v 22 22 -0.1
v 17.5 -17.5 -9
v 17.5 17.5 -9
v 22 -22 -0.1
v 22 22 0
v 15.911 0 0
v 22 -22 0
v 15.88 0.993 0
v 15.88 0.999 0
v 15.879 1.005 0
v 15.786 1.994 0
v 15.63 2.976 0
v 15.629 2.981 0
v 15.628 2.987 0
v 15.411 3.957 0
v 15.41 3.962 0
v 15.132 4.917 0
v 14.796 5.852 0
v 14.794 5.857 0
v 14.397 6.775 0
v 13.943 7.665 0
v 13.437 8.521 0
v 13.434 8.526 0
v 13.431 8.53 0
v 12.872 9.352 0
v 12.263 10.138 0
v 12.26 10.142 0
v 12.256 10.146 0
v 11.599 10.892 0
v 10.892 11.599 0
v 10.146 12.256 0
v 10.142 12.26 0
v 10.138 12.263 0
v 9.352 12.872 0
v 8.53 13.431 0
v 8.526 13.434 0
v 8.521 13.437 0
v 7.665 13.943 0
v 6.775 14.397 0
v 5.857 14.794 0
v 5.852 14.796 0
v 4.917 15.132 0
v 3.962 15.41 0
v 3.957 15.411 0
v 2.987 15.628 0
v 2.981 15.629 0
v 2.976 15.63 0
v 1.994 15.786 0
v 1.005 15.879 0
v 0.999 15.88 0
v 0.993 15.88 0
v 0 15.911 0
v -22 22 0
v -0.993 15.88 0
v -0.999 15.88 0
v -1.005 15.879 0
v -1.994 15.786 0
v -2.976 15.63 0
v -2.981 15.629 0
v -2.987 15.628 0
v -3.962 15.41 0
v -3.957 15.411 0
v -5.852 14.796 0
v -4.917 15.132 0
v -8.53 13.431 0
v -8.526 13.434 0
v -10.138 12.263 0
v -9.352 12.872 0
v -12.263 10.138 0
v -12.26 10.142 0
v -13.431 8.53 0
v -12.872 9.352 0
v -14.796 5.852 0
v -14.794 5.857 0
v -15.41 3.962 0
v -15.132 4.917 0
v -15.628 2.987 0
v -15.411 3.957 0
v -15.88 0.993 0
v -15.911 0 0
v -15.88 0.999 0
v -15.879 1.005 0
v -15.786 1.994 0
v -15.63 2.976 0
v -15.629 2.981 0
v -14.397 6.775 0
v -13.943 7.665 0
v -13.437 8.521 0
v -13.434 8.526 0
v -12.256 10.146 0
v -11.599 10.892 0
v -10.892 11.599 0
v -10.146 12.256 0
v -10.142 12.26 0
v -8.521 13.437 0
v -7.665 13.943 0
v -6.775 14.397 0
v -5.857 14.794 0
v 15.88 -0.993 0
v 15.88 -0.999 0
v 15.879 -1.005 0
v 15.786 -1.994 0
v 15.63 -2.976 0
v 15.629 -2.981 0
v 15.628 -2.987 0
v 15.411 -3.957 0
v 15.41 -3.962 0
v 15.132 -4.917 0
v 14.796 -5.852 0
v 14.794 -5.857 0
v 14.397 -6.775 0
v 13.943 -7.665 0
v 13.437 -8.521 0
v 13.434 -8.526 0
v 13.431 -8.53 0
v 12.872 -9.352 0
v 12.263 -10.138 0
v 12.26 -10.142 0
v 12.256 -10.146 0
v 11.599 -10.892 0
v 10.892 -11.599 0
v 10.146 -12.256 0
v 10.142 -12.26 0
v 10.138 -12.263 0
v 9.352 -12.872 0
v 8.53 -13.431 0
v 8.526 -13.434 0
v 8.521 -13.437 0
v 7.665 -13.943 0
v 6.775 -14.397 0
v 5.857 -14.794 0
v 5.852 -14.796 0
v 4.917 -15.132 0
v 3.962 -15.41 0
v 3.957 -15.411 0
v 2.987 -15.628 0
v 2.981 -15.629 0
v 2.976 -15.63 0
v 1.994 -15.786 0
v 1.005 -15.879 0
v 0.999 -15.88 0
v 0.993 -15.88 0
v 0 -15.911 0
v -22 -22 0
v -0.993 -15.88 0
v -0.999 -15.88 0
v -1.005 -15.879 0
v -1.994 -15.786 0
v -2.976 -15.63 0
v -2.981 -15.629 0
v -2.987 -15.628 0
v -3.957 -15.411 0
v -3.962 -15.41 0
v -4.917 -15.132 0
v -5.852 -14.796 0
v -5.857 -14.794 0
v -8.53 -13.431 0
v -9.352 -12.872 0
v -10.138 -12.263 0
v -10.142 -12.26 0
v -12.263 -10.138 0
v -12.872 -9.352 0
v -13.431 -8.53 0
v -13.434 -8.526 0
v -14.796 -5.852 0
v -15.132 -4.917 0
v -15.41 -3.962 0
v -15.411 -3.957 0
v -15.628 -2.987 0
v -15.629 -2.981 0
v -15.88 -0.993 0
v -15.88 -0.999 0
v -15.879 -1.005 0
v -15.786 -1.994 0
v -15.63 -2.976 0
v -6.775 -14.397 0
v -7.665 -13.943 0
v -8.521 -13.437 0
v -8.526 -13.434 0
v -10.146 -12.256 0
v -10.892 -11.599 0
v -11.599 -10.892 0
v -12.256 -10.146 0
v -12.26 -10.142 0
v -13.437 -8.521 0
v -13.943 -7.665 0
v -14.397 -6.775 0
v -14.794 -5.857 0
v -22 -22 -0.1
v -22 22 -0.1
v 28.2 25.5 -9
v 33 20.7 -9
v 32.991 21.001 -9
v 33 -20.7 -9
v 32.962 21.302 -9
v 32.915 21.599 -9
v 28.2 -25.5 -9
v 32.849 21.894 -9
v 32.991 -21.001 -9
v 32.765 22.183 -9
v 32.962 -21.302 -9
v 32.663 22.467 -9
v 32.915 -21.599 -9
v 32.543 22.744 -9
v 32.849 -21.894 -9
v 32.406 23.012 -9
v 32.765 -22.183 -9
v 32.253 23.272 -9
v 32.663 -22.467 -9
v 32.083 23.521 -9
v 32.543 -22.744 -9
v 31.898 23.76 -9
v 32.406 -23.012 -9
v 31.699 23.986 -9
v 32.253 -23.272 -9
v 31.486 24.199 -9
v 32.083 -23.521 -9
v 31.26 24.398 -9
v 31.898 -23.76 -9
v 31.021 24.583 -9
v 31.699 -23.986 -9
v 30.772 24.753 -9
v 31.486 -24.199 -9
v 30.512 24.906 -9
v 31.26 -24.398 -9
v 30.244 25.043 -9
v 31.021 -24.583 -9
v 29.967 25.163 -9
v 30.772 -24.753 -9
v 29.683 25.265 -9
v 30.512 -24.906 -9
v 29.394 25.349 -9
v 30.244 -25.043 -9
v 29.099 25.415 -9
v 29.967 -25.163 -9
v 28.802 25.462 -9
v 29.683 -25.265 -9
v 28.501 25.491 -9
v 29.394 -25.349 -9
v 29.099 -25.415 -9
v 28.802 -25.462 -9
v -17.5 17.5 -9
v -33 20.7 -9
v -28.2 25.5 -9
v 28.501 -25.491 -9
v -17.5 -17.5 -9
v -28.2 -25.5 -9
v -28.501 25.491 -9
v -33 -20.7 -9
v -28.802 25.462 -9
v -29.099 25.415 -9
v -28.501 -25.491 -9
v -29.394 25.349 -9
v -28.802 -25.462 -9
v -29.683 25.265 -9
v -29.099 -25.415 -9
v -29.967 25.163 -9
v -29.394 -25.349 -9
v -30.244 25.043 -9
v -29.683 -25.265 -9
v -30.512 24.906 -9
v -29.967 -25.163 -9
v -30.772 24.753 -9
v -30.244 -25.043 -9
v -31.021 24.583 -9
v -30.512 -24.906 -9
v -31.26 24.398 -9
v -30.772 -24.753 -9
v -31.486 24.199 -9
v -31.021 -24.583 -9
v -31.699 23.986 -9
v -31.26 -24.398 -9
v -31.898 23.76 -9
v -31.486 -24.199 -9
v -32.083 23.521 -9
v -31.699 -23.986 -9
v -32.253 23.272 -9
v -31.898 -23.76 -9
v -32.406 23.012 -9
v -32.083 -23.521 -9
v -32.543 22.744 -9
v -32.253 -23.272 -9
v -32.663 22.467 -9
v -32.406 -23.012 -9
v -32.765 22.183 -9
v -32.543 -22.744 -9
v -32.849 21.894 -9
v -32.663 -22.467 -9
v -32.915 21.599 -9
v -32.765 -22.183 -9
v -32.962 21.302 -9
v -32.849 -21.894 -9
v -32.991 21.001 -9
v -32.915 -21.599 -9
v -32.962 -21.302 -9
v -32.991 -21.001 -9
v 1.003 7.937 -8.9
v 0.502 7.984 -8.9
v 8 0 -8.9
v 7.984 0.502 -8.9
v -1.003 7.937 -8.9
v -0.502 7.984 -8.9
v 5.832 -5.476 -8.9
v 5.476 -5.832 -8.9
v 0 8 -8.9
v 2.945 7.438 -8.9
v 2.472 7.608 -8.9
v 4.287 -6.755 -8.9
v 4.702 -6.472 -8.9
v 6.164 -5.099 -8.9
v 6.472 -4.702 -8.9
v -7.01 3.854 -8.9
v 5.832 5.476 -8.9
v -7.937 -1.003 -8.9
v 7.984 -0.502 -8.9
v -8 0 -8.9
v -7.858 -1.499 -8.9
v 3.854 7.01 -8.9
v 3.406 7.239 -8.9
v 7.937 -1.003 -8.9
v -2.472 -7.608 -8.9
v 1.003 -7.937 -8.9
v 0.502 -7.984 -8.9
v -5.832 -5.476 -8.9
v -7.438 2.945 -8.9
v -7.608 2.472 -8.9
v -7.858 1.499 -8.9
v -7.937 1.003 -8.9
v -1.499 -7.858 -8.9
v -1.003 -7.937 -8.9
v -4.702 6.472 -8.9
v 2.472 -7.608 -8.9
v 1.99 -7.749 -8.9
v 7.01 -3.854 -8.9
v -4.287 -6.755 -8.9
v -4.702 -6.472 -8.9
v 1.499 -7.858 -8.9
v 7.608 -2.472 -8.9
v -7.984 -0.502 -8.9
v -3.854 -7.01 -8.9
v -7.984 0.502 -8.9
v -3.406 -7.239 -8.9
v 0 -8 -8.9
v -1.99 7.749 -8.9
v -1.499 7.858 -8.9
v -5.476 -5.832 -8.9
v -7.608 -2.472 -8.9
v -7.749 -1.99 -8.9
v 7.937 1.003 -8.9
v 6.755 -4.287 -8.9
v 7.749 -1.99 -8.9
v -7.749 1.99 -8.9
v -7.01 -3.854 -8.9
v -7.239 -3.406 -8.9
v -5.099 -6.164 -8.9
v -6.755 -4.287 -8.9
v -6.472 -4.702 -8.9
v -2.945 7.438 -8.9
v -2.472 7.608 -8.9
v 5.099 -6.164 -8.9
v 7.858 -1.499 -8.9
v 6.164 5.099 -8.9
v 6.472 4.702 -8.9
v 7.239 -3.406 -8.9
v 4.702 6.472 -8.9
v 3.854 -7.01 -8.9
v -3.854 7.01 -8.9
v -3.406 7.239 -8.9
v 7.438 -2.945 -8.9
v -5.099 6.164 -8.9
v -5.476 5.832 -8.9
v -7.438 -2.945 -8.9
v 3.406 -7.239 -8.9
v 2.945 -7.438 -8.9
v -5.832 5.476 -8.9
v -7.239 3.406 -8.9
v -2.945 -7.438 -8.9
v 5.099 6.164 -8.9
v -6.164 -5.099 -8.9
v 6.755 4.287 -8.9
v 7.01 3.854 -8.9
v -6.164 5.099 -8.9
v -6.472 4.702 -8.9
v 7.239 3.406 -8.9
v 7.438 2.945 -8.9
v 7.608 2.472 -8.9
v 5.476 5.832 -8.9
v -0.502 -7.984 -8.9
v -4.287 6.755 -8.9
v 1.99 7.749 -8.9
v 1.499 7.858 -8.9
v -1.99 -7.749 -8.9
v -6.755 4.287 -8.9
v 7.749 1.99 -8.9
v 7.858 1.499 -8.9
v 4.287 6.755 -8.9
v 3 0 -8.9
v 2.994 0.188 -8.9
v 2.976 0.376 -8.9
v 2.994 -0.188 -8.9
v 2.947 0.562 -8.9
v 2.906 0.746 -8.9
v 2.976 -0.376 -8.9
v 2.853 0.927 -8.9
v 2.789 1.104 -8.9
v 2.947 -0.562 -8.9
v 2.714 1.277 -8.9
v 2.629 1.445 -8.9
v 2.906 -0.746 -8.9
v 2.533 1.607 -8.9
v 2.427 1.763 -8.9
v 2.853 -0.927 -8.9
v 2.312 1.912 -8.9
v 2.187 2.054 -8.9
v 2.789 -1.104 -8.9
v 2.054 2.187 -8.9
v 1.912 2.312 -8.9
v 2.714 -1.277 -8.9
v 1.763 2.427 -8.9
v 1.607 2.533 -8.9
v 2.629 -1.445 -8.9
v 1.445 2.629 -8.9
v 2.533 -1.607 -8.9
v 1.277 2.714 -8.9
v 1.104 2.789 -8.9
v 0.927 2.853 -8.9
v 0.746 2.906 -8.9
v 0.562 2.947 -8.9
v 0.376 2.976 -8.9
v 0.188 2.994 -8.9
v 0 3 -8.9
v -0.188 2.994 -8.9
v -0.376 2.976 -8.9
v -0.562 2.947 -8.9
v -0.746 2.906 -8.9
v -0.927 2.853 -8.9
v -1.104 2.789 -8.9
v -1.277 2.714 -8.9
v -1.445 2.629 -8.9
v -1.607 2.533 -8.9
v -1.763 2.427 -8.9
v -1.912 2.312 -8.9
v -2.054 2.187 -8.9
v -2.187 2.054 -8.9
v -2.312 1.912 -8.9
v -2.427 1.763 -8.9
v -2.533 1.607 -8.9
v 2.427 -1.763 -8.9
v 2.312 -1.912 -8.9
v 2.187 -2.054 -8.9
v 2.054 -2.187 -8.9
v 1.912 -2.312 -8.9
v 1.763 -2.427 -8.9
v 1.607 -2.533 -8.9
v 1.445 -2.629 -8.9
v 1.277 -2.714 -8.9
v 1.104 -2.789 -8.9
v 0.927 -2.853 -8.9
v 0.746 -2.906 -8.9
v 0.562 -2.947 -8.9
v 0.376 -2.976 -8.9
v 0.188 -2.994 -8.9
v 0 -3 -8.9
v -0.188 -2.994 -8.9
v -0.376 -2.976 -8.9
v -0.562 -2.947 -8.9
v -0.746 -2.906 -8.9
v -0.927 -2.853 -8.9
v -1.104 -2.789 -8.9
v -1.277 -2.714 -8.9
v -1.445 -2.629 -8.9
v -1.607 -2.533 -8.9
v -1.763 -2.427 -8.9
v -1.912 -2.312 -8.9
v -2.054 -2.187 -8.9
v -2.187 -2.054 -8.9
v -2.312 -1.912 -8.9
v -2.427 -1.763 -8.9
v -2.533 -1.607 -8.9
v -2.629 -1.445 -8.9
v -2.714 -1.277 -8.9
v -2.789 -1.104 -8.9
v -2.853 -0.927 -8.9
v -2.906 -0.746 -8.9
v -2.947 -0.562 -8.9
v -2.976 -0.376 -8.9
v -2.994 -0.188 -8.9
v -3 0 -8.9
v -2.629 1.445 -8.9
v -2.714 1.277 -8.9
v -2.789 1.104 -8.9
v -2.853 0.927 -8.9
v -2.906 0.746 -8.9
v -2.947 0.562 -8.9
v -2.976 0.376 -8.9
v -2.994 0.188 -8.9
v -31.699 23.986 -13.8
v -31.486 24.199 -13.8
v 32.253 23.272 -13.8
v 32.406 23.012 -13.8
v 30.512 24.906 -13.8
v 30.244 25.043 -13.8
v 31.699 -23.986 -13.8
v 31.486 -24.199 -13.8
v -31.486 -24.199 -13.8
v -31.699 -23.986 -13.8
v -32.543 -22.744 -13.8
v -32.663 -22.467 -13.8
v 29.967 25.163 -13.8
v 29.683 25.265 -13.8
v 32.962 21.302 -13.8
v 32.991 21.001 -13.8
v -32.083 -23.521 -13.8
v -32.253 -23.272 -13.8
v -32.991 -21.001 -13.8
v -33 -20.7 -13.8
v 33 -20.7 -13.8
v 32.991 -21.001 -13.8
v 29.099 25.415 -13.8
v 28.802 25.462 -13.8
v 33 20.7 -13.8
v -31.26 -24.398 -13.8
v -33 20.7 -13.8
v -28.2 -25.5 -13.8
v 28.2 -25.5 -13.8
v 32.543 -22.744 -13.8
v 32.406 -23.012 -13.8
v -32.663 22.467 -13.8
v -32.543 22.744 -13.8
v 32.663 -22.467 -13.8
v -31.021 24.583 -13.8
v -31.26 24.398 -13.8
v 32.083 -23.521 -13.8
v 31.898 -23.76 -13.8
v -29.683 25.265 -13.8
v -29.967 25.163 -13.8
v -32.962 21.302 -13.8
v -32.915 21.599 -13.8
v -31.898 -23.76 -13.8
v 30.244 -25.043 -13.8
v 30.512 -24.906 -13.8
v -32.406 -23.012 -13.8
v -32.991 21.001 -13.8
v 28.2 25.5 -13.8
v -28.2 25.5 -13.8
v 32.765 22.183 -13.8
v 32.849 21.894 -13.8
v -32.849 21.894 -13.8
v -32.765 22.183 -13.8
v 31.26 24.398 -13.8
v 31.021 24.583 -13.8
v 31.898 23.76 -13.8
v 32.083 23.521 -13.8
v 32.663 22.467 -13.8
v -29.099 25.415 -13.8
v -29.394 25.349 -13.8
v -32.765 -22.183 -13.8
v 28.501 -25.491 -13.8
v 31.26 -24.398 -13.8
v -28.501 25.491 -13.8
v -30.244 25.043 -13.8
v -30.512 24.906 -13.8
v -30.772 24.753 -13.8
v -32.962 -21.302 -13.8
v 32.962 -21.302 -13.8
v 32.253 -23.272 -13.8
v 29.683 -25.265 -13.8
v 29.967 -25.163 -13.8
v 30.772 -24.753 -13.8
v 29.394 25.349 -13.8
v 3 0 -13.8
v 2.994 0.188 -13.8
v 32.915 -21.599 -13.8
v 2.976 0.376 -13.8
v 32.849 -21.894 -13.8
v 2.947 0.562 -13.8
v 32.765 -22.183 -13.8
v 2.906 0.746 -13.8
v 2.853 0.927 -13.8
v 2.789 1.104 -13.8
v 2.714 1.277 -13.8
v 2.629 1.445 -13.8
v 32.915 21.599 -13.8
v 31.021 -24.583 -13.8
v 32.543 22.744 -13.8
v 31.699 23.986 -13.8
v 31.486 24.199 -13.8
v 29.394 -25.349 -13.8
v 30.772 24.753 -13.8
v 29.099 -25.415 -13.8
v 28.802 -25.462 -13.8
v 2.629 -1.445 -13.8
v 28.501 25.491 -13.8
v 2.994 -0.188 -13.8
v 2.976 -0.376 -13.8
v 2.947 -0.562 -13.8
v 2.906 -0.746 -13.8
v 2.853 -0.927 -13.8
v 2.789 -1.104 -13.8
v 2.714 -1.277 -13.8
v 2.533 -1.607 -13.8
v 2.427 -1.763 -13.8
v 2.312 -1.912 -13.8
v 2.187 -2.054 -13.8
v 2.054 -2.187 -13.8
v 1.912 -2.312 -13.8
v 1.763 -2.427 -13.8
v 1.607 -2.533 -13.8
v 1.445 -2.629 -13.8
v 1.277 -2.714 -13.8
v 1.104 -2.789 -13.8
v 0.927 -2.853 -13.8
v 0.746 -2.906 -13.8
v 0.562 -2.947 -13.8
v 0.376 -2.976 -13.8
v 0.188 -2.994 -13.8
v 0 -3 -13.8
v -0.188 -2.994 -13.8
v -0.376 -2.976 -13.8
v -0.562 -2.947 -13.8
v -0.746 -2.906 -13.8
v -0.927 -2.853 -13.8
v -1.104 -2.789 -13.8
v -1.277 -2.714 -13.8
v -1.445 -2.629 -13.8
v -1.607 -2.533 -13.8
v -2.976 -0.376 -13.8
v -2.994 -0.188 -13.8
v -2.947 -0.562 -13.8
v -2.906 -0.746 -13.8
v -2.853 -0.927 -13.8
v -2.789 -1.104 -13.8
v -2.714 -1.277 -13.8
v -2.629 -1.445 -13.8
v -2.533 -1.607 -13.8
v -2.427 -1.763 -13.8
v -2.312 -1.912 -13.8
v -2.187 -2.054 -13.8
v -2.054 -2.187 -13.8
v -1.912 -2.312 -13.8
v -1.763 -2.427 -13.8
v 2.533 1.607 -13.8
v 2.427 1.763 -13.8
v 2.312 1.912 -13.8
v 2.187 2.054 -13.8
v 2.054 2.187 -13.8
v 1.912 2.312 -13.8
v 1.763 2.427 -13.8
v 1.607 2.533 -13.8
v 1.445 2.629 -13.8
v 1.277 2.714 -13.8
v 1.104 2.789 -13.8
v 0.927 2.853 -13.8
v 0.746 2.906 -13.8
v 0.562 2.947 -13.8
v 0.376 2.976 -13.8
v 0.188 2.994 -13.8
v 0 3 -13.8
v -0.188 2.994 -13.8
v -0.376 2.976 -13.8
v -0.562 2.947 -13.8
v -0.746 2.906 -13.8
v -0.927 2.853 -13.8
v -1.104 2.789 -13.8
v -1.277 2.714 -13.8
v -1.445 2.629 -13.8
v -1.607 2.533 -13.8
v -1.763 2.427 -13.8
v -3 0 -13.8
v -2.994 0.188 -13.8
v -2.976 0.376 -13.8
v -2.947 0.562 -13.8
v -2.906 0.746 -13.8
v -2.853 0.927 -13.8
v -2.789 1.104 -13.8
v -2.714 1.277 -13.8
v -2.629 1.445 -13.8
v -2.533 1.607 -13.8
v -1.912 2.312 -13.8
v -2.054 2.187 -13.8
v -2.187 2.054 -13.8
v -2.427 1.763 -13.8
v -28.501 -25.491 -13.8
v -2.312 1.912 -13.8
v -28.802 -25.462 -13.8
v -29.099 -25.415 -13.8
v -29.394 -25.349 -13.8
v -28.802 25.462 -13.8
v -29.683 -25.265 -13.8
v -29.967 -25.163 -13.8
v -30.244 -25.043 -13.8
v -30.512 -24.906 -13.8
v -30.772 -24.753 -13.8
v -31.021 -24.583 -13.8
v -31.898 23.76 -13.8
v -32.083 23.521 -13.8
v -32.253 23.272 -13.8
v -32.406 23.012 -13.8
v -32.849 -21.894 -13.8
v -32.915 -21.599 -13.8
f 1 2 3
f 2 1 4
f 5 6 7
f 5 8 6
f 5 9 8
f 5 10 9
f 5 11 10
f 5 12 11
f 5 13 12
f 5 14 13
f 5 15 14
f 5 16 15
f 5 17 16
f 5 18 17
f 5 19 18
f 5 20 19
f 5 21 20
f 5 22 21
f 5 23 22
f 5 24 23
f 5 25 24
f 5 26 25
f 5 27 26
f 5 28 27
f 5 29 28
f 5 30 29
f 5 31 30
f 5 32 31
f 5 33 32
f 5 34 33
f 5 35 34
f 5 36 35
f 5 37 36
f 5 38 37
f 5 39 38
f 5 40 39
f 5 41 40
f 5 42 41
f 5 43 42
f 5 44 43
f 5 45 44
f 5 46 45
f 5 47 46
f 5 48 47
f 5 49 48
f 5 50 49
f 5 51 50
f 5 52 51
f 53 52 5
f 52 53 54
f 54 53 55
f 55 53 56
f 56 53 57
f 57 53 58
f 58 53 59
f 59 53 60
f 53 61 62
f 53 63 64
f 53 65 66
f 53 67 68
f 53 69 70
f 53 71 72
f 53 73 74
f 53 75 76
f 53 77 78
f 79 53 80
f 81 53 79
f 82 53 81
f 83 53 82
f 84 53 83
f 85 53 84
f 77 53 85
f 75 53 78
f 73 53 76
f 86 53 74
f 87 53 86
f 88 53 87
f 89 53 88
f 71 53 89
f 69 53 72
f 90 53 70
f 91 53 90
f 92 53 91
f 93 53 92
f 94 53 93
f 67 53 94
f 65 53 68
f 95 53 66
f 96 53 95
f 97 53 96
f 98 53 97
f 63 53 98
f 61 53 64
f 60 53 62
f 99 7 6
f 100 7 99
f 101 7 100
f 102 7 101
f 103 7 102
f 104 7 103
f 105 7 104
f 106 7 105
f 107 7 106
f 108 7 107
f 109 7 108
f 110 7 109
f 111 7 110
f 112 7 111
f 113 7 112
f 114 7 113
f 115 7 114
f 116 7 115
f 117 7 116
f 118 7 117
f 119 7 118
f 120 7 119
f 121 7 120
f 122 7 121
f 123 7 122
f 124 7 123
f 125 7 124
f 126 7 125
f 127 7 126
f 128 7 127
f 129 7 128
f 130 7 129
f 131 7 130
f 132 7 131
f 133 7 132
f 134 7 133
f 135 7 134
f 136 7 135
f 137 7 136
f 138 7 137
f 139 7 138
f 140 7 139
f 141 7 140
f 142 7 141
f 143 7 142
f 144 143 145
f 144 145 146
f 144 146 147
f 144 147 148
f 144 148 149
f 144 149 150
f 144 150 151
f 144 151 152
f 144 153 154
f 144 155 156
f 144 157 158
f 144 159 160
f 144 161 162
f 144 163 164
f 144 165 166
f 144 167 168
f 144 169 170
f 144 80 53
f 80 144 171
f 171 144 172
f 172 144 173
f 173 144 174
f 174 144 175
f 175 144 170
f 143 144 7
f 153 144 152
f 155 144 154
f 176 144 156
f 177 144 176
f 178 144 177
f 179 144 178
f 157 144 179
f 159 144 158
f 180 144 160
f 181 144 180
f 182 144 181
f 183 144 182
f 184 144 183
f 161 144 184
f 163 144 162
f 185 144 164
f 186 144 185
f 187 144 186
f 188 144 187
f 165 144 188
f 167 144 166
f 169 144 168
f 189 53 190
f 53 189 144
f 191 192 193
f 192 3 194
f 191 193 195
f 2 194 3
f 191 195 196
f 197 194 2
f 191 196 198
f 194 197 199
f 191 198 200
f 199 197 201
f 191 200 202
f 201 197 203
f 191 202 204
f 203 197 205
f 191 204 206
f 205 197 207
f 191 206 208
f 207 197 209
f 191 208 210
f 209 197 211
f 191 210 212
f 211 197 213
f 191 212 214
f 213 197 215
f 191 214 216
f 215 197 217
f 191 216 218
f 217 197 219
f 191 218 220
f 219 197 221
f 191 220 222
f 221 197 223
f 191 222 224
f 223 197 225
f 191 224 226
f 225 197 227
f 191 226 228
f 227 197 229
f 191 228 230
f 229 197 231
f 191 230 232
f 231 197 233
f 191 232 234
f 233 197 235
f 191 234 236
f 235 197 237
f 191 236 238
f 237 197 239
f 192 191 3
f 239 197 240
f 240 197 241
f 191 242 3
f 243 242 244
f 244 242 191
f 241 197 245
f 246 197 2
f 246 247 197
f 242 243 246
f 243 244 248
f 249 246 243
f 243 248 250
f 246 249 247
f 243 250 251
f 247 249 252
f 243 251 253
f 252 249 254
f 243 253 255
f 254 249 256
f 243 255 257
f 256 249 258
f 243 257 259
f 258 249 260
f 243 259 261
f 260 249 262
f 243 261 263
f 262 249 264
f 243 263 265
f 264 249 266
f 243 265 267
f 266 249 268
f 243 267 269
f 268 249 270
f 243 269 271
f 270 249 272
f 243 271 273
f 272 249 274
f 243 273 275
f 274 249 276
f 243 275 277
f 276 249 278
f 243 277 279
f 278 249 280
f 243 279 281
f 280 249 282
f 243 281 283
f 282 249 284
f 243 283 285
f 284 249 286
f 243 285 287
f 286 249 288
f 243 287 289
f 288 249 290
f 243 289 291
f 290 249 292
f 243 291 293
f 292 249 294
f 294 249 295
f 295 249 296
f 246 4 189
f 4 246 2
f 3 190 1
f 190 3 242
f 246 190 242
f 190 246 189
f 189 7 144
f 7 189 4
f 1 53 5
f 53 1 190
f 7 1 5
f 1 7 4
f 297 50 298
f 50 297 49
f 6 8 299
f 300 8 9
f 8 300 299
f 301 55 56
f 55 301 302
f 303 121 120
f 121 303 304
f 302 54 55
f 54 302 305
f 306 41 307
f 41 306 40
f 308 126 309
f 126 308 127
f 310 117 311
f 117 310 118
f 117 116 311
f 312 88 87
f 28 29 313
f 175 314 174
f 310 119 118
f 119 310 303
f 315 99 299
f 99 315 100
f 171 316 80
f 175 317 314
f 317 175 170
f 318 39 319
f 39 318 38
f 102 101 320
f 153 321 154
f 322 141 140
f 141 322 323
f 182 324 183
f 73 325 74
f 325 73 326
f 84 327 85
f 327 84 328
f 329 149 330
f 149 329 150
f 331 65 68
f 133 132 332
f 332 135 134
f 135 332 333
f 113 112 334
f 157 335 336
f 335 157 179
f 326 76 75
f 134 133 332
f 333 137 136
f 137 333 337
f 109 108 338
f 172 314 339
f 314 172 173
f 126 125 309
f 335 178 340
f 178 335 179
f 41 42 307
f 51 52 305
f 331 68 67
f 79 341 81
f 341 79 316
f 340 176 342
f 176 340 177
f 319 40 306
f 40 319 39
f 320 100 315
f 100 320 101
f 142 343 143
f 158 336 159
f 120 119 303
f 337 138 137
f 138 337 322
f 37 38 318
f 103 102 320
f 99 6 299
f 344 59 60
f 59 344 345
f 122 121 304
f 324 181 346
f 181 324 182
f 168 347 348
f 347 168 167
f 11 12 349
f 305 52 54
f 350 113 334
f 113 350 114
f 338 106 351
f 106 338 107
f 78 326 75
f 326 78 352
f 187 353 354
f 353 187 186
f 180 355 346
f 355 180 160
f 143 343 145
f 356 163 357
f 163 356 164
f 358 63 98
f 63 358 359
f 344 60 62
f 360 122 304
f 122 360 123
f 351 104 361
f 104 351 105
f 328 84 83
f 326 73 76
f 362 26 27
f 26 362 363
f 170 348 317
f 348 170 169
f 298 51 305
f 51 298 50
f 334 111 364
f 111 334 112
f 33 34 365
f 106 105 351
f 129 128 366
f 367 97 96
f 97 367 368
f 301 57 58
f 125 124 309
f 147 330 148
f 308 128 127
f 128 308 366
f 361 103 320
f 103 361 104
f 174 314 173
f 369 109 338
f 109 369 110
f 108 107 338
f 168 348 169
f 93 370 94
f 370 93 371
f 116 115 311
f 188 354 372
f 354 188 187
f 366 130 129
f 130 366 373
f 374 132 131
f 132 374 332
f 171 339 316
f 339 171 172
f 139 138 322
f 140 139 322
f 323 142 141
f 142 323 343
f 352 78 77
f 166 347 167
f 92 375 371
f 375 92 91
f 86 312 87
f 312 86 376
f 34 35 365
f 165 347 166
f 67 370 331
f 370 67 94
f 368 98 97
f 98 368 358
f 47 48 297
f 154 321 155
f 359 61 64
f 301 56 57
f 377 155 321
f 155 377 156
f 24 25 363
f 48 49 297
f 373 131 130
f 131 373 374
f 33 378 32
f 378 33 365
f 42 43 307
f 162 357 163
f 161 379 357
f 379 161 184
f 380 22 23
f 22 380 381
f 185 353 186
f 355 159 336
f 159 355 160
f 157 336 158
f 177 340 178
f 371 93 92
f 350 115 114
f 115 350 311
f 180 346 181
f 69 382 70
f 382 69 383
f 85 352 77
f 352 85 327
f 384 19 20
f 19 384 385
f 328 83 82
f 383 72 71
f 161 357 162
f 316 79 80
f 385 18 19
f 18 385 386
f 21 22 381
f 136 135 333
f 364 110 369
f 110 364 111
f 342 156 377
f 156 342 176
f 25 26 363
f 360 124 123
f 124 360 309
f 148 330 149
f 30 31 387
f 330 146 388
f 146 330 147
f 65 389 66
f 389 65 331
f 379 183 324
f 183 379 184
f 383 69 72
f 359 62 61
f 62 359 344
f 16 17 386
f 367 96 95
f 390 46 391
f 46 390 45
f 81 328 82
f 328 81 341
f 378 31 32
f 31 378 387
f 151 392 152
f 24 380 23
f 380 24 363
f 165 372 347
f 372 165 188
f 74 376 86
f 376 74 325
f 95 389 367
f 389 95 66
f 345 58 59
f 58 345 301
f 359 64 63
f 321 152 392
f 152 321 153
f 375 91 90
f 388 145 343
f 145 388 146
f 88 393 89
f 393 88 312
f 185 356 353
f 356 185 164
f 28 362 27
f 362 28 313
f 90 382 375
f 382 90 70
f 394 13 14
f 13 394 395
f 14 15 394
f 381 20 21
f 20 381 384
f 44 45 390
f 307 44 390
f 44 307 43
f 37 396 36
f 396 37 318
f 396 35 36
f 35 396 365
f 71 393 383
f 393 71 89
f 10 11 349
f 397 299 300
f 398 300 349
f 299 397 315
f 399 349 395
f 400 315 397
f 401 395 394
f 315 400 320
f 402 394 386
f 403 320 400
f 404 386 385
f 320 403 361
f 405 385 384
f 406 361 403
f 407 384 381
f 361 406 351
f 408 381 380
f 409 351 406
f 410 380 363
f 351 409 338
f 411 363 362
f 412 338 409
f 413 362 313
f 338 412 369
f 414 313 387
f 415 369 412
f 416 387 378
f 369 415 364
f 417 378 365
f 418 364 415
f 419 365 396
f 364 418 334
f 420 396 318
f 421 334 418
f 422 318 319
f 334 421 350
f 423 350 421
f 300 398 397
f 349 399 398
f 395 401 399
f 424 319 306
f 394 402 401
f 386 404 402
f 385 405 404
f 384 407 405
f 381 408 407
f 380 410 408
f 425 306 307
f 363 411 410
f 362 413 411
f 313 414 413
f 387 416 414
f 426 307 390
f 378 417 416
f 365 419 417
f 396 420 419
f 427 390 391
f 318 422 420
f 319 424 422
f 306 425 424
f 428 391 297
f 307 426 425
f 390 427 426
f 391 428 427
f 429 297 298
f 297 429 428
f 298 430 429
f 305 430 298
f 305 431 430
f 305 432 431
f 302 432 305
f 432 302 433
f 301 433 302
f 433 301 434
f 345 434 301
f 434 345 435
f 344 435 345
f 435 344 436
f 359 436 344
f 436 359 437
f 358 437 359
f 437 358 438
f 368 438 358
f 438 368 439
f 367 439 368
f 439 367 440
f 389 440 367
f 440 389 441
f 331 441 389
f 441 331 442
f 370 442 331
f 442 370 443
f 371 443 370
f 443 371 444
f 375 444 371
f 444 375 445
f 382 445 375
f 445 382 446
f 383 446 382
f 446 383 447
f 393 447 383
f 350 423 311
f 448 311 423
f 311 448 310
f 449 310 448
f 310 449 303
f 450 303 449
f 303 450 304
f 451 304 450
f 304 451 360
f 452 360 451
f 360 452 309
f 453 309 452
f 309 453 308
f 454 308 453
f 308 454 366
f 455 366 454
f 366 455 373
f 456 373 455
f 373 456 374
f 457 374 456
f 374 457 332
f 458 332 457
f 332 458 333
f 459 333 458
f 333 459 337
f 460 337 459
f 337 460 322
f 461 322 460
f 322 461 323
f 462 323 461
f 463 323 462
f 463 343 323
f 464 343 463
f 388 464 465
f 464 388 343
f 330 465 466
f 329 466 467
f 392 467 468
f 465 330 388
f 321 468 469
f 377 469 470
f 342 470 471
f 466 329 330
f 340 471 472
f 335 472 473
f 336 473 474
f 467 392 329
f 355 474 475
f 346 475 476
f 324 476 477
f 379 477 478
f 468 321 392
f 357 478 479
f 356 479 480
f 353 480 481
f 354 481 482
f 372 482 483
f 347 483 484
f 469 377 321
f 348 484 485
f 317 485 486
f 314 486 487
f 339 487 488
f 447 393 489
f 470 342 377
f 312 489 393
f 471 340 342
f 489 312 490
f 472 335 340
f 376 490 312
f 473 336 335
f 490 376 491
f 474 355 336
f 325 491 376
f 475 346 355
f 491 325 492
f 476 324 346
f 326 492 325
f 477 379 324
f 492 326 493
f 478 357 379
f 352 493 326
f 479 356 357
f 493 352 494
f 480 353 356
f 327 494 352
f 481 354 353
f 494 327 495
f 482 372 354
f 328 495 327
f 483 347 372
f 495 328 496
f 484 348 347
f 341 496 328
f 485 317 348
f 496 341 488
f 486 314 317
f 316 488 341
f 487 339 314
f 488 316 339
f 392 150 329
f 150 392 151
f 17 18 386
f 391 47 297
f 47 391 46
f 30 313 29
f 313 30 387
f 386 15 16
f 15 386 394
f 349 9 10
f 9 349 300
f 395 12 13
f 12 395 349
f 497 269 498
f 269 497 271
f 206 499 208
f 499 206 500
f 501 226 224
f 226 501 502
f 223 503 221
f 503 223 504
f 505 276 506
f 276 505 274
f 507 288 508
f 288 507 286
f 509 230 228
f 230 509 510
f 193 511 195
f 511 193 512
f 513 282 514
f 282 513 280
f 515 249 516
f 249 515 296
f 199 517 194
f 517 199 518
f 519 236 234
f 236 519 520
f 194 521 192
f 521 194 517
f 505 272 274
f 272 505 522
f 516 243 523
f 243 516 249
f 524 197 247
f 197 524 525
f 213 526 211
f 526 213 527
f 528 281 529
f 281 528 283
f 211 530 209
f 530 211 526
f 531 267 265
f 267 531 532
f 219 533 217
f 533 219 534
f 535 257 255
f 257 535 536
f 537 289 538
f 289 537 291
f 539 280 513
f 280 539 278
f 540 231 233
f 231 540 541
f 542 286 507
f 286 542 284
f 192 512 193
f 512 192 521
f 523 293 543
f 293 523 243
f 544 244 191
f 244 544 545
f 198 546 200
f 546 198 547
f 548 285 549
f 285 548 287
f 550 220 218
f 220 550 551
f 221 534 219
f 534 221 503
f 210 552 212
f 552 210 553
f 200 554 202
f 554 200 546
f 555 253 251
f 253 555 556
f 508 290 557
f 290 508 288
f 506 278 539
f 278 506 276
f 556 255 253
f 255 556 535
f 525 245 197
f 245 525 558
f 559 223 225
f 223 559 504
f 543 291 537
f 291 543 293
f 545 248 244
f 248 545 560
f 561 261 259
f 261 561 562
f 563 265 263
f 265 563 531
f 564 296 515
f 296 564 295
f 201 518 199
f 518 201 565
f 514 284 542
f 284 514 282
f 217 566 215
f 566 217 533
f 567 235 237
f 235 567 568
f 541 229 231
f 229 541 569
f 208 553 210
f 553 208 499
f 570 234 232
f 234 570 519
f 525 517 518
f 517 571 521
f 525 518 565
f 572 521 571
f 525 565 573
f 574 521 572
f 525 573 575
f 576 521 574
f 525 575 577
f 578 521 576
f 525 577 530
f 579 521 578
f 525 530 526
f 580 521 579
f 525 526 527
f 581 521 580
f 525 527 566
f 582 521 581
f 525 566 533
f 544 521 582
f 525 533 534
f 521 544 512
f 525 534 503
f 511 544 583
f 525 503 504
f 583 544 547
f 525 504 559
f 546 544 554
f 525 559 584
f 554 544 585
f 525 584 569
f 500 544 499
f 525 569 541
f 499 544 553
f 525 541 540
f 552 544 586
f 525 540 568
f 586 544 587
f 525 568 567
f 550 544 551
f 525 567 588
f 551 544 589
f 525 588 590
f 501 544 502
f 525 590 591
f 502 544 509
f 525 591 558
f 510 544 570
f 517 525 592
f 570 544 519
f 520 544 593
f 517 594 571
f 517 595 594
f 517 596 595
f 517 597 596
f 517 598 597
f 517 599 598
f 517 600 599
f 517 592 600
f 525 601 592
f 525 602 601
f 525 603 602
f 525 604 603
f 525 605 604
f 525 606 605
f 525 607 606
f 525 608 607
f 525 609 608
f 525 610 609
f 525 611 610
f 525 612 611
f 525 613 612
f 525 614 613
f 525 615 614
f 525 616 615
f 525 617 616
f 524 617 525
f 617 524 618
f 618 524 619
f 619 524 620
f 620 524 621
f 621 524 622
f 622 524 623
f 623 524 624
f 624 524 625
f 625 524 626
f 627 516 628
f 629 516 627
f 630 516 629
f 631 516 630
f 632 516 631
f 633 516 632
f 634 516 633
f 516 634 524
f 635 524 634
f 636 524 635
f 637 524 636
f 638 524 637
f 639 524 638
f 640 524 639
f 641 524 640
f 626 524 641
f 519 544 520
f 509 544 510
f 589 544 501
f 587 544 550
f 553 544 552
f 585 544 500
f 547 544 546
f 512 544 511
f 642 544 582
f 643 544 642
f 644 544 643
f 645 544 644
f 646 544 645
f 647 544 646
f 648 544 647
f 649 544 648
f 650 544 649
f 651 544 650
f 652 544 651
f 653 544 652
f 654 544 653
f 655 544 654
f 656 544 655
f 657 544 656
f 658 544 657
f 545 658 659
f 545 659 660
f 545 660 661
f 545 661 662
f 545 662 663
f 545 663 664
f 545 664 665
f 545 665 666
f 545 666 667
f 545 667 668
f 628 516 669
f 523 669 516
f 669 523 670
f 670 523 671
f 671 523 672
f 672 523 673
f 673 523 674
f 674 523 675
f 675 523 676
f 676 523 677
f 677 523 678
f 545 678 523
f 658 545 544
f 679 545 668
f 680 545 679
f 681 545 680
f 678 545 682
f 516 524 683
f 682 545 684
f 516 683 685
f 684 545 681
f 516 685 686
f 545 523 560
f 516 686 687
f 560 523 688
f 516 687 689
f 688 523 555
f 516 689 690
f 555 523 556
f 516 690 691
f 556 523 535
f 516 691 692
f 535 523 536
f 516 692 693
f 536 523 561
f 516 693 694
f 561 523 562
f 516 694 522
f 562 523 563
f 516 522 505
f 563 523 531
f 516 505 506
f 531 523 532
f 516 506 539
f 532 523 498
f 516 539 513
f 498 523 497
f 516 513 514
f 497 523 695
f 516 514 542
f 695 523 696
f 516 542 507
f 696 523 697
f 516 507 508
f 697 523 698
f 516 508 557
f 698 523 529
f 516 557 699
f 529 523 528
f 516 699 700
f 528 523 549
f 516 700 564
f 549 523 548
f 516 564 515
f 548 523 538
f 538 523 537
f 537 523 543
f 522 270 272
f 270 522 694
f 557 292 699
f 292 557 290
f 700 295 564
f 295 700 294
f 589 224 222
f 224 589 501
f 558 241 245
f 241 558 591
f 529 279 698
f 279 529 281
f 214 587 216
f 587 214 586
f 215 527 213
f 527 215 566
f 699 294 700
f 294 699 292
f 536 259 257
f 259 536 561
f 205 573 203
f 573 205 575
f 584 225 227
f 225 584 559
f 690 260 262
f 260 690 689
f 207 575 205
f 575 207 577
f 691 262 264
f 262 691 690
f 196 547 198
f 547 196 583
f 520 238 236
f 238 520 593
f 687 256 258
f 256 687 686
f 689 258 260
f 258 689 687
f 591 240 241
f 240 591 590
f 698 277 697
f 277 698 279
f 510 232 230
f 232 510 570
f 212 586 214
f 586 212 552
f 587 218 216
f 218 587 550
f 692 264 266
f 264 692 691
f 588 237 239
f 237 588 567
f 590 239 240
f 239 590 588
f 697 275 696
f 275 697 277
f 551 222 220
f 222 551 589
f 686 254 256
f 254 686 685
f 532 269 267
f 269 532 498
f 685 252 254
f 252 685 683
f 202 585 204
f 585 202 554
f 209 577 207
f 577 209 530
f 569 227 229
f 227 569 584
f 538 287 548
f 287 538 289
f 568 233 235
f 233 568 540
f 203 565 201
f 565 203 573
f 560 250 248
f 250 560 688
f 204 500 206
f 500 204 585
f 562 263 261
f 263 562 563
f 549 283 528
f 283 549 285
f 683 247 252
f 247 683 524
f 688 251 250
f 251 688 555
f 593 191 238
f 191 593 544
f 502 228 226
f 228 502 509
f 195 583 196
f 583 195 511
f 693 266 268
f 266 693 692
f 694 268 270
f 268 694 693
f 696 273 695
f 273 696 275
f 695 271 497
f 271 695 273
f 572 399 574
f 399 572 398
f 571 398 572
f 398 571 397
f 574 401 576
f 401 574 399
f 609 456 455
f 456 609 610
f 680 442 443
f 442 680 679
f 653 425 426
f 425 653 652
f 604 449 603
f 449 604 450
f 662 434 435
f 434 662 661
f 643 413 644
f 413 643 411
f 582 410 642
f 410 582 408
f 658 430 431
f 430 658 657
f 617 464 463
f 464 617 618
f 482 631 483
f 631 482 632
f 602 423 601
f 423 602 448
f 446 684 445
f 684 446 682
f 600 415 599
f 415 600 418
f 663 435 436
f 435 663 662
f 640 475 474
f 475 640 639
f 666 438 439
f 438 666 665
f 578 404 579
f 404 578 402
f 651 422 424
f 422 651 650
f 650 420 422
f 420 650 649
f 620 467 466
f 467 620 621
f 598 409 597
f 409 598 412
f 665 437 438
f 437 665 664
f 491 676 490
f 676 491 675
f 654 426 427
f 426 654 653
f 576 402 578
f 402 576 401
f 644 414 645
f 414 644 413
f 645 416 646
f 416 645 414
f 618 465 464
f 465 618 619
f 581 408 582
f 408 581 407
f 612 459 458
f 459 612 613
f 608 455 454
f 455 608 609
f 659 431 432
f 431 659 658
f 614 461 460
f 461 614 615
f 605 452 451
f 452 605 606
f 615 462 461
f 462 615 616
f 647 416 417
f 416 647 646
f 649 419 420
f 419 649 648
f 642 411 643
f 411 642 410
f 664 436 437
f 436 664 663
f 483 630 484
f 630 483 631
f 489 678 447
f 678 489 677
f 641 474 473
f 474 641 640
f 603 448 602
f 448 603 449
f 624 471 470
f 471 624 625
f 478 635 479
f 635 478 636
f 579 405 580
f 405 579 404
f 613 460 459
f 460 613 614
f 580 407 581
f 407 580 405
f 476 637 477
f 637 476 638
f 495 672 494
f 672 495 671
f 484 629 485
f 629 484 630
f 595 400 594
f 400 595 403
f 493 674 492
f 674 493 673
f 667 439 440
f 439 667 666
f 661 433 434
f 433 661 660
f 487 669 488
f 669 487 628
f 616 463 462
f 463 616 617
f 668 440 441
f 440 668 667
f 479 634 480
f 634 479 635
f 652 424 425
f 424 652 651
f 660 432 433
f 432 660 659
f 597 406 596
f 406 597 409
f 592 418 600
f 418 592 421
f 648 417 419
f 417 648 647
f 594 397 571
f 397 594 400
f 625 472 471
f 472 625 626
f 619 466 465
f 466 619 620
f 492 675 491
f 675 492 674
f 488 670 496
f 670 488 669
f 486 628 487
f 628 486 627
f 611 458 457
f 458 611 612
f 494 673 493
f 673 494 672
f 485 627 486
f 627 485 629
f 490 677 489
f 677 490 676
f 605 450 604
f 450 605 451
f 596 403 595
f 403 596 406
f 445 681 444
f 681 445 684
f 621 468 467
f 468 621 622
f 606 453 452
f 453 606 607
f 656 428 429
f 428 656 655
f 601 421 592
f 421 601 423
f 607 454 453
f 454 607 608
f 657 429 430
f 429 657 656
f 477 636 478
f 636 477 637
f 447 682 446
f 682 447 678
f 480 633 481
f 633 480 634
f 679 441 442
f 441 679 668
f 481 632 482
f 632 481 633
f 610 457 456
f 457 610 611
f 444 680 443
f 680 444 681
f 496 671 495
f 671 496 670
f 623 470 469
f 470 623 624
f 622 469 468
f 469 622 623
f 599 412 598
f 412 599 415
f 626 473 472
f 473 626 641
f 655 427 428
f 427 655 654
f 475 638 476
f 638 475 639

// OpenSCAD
/*
    created 11 Jan 2021
    by Matt Jones (Crazy-Logic)  

    This example code is in the public domain.
    
    This is for mounting cameras and other stuff with a standard camera thread to a Hama tripod stand. 
*/
//do a difference to remove bold hole 
difference(){
    //do a union of the top and bottom bits. 
    union(){ 
            difference(){
                //do a hull of two cuboids to form the angely bit
                hull(){
                    translate([-22,-22,-0.1])
                        cube([44,44,0.1],false);
                    translate([-17.5,-17.5,-9])
                        cube([35,35,1],false);
                }
                //lets remove the angley circle bit so you can get to the bolt
                translate([0,0,-8.9])
                    cylinder(9, 8, 16, false,$fn=100);
                
            }
            //do a hull of 4 cyclinders to make a rounded cub
            hull(){
                    rad = 4.8;
                    h = 4.8;
                    translate([-33+rad,-25.5+rad,-9-h])
                        cylinder(h, rad, rad, false,$fn=100);
                    translate([+33-rad,-25.5+rad,-9-h])
                        cylinder(h, rad, rad, false,$fn=100);
                    translate([-33+rad,25.5-rad,-9-h])
                        cylinder(h, rad, rad, false,$fn=100);
                    translate([+33-rad,25.5-rad,-9-h])
                        cylinder(h, rad, rad, false,$fn=100);
                    
                }
    }


    //lets make a hole for the threaded bit of the bolt
            translate([0,0,-13.9])
                cylinder(14, 3, 3, false,$fn=100);
}
